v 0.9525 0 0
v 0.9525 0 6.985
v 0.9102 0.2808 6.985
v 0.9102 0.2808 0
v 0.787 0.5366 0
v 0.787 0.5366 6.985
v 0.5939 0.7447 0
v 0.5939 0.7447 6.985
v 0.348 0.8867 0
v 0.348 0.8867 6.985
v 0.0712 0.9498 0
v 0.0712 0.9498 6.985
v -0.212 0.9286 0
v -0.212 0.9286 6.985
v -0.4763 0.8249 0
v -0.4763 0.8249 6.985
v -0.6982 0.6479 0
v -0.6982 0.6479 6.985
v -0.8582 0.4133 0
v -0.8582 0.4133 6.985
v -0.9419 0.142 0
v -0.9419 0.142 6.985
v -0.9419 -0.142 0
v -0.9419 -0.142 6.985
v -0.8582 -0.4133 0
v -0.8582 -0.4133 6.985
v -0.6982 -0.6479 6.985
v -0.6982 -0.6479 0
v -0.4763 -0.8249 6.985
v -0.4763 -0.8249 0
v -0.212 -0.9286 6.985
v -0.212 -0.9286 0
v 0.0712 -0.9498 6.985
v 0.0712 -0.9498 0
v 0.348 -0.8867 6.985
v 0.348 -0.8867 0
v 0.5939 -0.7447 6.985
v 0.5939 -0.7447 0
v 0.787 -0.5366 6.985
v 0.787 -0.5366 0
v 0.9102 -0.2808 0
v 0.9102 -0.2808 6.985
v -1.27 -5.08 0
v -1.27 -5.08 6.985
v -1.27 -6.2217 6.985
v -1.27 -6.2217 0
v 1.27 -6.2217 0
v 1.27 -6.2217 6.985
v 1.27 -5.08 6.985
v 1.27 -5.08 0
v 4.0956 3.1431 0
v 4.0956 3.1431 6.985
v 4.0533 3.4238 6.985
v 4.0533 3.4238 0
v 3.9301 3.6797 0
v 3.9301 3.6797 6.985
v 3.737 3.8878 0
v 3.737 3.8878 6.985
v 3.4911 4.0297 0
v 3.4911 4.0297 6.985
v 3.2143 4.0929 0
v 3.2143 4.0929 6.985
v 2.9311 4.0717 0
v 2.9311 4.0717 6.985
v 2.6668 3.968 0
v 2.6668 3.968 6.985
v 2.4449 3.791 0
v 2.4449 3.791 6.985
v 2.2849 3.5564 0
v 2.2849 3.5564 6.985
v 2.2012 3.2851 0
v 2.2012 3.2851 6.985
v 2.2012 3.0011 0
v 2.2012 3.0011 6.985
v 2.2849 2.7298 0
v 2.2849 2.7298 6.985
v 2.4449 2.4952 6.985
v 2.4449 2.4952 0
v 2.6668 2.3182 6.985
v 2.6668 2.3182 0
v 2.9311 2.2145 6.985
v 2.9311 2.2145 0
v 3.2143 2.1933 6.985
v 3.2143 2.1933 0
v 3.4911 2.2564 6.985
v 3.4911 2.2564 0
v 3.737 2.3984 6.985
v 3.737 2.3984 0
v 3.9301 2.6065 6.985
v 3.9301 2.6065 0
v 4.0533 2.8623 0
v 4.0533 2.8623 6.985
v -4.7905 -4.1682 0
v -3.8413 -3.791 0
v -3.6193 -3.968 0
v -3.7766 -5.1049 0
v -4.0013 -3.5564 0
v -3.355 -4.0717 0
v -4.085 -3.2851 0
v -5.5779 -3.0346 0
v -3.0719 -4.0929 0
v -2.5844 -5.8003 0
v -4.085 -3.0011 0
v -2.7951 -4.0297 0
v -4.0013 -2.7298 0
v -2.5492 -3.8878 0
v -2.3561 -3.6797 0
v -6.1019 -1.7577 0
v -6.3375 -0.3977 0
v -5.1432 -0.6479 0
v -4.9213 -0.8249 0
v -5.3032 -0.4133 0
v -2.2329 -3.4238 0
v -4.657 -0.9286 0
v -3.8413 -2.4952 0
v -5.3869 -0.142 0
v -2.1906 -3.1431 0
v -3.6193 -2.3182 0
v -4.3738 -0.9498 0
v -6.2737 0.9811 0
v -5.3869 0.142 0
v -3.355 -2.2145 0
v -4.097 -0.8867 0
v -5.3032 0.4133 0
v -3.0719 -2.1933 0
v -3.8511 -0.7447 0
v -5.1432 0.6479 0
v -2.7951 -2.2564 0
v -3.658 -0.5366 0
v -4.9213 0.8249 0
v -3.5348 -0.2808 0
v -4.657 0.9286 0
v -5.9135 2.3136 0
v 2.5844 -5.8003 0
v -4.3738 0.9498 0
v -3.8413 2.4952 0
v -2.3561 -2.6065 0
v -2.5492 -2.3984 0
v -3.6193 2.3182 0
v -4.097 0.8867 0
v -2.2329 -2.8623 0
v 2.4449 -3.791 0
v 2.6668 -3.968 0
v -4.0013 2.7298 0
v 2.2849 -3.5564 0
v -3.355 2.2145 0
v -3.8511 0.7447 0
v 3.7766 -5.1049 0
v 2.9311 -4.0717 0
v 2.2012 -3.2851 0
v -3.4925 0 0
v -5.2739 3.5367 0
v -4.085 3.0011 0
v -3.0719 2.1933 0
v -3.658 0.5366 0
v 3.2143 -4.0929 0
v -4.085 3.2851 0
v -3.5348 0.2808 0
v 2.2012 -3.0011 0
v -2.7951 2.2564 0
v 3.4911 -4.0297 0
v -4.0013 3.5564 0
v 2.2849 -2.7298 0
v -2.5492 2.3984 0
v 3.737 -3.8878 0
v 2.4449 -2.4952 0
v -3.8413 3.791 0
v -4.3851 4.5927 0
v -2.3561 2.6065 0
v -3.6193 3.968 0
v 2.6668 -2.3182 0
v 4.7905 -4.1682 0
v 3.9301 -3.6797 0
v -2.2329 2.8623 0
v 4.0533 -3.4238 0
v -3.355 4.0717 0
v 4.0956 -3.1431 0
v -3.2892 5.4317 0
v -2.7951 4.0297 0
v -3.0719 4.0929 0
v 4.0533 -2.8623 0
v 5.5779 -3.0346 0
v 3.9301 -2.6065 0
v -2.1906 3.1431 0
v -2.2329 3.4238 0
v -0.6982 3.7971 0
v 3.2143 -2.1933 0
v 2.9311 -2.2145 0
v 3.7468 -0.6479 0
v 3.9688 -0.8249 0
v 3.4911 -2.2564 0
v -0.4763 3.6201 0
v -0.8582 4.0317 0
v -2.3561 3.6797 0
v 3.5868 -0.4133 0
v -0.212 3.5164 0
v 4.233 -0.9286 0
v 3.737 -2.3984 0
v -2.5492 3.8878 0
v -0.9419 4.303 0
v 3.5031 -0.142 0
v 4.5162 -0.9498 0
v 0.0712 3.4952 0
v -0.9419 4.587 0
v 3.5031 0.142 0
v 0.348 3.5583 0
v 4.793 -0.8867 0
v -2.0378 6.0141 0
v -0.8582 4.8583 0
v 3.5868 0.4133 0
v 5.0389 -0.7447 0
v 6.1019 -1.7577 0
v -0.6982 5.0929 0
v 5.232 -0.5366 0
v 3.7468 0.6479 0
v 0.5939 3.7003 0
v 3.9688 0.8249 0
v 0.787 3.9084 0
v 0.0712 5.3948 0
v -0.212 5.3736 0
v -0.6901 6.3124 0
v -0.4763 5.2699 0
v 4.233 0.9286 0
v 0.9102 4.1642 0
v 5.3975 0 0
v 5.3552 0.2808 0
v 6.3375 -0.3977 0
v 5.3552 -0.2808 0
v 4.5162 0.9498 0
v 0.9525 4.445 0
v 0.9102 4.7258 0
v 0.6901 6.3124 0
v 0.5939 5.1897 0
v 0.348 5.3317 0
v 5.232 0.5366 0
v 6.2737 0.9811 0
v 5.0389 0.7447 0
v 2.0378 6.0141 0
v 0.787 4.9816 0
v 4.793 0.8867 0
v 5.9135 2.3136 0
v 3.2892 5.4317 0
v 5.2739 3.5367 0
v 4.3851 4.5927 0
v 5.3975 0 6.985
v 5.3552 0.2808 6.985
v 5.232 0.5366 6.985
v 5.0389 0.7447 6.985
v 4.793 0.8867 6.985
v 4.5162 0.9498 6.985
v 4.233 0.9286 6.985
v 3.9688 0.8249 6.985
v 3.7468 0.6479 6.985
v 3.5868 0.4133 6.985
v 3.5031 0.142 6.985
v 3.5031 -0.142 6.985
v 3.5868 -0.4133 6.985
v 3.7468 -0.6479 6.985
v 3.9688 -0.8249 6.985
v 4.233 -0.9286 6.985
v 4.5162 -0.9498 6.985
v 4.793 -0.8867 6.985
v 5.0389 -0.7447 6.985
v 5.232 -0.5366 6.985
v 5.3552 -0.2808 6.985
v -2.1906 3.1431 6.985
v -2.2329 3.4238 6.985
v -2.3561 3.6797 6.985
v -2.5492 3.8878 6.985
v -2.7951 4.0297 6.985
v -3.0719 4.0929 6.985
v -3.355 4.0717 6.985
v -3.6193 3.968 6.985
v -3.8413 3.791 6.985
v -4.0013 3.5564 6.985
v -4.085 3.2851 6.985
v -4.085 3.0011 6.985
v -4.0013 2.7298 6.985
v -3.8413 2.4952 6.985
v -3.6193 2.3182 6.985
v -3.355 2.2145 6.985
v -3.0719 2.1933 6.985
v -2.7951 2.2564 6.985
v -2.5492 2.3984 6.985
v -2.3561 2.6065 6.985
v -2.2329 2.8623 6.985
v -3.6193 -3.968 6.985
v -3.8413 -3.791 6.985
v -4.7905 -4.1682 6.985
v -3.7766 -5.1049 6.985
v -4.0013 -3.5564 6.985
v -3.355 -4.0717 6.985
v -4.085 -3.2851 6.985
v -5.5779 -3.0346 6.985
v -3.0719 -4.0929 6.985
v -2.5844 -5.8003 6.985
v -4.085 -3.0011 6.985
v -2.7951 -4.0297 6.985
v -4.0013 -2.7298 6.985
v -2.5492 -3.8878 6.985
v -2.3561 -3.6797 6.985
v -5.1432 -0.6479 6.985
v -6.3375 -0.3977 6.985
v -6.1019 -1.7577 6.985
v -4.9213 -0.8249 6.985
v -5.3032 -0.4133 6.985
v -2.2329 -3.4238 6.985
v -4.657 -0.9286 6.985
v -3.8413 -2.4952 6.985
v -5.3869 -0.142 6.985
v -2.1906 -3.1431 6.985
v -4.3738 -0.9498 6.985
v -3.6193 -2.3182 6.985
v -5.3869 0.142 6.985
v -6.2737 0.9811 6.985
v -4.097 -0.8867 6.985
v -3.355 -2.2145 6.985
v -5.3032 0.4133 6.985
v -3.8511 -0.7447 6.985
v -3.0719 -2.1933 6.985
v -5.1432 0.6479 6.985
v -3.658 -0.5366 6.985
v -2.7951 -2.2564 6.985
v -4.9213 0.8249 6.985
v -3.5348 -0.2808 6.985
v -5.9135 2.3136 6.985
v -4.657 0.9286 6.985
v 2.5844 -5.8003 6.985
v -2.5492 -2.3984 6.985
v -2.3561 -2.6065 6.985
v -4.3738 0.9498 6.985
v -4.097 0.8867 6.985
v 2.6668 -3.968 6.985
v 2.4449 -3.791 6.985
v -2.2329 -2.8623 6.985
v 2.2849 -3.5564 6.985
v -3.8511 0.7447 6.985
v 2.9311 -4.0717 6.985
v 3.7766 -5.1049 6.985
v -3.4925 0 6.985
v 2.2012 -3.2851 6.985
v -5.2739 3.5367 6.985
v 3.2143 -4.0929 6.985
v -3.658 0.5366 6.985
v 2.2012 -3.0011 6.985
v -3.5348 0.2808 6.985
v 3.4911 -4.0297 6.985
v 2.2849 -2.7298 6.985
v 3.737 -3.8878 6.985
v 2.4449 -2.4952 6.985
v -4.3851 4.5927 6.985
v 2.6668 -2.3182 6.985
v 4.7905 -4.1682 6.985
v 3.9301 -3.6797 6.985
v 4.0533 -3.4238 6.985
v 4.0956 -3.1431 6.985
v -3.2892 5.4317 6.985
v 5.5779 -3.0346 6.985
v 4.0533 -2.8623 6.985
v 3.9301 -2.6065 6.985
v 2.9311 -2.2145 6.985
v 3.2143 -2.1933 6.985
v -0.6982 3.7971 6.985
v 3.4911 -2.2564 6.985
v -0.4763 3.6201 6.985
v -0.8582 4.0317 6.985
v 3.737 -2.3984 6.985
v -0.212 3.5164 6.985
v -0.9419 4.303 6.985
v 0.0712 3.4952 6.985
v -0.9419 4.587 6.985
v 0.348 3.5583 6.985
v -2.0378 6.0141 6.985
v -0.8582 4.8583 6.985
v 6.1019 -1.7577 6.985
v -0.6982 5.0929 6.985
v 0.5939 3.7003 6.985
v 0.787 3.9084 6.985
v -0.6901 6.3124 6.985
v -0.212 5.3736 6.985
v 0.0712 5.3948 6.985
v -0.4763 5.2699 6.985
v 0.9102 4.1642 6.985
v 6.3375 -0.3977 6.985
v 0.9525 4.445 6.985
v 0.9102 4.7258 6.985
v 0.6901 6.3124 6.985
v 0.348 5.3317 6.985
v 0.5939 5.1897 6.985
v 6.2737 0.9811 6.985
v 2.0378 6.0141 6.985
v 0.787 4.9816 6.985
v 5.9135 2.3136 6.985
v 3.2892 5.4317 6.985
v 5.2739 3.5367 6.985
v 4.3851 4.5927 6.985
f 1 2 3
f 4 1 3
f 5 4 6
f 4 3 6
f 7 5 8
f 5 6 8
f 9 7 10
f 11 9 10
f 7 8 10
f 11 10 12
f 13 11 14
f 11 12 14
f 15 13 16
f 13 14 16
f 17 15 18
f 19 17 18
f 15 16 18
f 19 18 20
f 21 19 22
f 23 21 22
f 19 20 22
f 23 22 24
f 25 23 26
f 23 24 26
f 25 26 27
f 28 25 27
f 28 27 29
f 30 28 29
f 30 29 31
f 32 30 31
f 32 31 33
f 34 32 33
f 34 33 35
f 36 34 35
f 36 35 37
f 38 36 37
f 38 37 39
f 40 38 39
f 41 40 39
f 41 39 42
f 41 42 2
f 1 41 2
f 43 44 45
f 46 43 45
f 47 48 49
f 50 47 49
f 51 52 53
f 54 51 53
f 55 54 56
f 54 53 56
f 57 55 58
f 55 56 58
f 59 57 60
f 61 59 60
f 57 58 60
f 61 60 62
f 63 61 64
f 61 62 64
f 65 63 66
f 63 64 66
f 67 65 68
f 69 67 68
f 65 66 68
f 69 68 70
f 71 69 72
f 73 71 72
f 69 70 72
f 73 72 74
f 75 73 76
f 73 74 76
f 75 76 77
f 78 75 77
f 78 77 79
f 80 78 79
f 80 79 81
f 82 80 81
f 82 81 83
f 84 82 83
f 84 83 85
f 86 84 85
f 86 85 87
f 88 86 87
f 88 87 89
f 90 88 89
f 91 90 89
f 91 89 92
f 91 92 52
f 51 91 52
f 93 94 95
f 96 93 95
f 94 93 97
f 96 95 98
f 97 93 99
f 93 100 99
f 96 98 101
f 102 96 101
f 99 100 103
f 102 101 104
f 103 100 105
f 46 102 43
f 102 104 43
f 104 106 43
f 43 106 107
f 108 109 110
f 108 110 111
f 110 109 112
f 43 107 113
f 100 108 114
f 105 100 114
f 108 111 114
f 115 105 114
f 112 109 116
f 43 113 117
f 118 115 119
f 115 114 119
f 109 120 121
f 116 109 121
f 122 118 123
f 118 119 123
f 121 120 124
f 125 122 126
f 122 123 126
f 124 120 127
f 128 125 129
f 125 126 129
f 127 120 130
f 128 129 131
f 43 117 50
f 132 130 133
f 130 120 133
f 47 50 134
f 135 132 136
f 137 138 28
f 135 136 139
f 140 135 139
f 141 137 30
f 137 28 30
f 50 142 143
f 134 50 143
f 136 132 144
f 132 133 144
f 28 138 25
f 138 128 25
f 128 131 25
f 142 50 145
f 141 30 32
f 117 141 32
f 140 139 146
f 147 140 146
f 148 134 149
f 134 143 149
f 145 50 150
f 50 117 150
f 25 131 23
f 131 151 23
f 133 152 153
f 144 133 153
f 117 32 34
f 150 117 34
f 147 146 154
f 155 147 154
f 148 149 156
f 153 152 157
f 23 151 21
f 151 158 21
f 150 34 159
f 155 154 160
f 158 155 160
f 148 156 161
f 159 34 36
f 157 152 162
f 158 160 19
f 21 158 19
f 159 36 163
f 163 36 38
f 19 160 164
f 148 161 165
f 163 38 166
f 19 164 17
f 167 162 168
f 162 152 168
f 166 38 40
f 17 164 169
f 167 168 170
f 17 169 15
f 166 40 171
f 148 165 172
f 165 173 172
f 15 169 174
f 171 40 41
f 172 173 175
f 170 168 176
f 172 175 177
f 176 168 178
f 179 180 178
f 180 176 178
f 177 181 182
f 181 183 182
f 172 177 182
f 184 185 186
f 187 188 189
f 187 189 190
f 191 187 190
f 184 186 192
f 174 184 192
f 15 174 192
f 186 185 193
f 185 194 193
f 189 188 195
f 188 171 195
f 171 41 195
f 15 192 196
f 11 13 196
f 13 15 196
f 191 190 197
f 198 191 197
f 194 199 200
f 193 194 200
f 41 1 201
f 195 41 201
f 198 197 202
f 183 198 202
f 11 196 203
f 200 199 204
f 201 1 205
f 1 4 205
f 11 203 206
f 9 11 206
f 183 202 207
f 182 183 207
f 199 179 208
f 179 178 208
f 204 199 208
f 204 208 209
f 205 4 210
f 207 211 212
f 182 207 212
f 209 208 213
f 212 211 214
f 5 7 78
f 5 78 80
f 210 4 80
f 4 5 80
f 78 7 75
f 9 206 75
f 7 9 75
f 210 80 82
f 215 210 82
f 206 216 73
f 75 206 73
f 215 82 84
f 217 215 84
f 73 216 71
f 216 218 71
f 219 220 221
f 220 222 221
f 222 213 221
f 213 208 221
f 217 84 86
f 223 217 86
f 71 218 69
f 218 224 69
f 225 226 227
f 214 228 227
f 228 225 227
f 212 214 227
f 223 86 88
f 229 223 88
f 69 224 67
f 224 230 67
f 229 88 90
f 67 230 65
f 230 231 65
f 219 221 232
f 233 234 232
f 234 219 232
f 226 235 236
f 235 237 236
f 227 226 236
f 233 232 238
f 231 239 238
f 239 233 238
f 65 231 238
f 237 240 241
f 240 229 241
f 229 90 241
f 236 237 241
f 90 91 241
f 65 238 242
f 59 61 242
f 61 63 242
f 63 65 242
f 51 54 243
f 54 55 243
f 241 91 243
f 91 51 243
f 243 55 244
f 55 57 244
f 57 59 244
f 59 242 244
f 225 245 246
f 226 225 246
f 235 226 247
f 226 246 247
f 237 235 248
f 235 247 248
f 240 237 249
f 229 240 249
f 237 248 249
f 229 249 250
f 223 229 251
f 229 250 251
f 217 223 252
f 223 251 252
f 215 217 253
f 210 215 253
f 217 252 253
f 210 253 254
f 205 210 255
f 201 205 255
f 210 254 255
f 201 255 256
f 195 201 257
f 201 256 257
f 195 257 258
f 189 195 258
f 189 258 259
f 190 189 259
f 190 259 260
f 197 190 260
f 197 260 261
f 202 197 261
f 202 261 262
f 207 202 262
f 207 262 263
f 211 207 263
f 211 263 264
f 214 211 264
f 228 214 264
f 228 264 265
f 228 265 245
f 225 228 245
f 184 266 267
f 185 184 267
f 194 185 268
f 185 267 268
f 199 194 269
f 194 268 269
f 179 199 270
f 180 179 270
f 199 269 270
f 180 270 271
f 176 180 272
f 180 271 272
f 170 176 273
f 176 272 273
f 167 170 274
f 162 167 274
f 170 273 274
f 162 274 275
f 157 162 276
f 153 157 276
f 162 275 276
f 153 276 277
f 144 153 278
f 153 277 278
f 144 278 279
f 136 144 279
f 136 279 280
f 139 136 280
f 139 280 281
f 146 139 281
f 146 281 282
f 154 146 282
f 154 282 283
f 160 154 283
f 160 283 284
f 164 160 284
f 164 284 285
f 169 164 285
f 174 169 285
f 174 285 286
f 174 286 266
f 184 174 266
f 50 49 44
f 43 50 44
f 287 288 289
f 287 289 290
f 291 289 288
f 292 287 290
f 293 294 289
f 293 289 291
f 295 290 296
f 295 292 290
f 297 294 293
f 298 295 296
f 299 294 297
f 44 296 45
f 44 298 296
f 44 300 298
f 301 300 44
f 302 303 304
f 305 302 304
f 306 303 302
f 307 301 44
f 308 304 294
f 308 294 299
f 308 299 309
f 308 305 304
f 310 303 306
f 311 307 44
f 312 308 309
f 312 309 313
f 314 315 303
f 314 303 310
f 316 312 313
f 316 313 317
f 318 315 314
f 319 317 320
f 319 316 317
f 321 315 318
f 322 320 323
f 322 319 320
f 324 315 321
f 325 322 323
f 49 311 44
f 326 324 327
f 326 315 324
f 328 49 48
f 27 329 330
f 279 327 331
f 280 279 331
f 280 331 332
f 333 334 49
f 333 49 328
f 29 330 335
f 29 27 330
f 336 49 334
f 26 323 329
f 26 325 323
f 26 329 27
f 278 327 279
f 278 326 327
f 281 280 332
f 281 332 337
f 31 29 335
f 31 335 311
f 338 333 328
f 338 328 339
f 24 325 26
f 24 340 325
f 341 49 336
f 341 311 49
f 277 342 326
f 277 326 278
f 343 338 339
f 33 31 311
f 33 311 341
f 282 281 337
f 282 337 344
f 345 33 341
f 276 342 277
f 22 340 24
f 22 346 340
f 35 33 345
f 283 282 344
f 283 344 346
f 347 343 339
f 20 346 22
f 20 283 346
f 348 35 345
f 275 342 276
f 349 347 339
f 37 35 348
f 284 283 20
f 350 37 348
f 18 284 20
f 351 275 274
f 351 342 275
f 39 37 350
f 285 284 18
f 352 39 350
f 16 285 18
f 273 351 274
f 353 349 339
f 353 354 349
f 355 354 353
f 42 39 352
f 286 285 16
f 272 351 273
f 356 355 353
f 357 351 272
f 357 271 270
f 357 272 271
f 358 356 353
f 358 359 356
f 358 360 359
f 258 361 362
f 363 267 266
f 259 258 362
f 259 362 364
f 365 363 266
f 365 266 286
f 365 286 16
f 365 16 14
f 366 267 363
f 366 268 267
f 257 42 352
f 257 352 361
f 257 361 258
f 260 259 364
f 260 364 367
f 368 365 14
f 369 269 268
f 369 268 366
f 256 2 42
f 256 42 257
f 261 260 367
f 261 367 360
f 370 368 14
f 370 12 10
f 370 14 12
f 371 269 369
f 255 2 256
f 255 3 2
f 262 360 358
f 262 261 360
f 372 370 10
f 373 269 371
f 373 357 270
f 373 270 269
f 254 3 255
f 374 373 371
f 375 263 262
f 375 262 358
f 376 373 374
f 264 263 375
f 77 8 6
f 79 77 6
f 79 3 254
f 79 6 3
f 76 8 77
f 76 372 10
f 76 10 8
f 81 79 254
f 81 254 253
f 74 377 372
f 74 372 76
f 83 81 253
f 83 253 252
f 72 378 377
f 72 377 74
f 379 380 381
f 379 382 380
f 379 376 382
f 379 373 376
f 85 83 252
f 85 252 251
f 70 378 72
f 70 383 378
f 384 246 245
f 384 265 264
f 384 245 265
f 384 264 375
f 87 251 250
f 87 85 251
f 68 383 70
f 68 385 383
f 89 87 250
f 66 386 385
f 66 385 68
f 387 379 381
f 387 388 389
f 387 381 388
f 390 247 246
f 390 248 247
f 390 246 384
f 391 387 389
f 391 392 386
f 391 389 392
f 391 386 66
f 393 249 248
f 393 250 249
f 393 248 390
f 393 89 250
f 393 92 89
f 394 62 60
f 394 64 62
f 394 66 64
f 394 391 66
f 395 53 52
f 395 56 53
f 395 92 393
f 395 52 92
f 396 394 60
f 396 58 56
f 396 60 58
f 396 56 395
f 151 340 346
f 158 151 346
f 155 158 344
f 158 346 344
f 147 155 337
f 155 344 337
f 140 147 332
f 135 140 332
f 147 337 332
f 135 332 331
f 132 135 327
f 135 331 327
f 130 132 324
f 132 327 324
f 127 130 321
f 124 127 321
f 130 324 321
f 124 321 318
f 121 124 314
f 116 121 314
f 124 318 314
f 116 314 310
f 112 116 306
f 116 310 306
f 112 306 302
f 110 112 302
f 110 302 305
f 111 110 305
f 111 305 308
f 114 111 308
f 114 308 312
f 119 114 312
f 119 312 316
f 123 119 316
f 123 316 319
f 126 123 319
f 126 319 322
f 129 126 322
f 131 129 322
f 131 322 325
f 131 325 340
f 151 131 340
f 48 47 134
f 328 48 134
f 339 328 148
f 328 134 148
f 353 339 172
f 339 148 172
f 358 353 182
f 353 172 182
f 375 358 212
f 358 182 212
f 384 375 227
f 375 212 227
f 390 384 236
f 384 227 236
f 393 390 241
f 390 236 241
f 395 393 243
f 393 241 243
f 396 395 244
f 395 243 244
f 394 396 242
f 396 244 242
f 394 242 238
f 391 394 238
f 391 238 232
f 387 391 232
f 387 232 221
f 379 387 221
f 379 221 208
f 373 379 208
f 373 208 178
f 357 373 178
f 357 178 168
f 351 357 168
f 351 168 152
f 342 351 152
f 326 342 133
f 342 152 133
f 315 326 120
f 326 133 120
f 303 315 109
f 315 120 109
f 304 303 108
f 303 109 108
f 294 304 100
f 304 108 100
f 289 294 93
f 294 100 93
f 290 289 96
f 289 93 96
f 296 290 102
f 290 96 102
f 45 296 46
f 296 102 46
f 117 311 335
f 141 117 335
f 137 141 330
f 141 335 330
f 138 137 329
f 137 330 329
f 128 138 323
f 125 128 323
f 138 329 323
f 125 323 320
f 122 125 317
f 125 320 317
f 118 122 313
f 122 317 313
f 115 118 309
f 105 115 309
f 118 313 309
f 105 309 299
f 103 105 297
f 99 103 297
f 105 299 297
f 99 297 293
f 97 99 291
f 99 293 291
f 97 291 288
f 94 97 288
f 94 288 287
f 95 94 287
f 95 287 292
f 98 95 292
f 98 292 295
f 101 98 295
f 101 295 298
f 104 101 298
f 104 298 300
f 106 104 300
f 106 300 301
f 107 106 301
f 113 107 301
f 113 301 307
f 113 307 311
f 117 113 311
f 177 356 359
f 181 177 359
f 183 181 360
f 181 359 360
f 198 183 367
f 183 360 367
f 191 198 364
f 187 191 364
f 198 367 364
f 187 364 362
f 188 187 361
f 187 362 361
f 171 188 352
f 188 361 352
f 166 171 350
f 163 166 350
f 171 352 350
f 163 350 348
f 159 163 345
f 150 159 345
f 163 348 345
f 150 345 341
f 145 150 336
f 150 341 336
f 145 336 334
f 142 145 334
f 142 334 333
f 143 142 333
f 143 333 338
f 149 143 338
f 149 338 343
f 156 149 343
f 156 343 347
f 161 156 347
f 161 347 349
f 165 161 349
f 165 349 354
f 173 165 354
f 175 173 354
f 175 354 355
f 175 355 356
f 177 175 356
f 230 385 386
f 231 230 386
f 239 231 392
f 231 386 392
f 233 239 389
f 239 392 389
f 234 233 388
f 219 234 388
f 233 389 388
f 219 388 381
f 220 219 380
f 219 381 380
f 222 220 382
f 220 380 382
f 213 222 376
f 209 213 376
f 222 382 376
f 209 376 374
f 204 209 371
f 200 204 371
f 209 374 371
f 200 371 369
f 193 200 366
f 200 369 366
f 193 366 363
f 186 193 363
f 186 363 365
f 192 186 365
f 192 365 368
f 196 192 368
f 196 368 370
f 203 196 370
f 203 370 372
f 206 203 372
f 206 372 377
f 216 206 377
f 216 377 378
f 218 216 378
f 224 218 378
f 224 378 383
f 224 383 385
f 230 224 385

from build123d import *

# Parameters (mm, degrees)
F0_R     = 6.35
F1_DEPTH = 6.985
F2_R     = 0.9525
F3_DEPTH = 6.986
F5_DEPTH = 6.986


with BuildPart() as f1:
    # F0 (on Top) → F1 (new body)
    with BuildSketch(Plane.XY):
        Circle(F0_R)
    extrude(amount=F1_DEPTH)

    # F2 (on face) → F3 (cut, through all)
    with BuildSketch(Plane.XY.offset(6.985)):
        with Locations((0, 4.445)):
            Circle(F2_R)
        with Locations((3.14309, 3.14309)):
            Circle(F2_R)
        with Locations((3.14309, -3.14309)):
            Circle(F2_R)
        with Locations((-3.14309, 3.14309)):
            Circle(F2_R)
        with Locations((-3.14309, -3.14309)):
            Circle(F2_R)
        with Locations((-4.445, 0)):
            Circle(F2_R)
        with Locations((4.445, 0)):
            Circle(F2_R)
        Circle(F2_R)
    extrude(amount=-F3_DEPTH, mode=Mode.SUBTRACT)

    # F4 (on face) → F5 (cut, through all)
    with BuildSketch(Plane.XY.offset(6.985)):
        with BuildLine():
            Line((-1.27, -5.08), (-1.27, -6.221704))
            ThreePointArc((-1.27, -6.221704), (0, -6.35), (1.27, -6.221704))
            Line((1.27, -6.221704), (1.27, -5.08))
            Line((1.27, -5.08), (-1.27, -5.08))
        make_face()
    extrude(amount=-F5_DEPTH, mode=Mode.SUBTRACT)


solid = f1.part
